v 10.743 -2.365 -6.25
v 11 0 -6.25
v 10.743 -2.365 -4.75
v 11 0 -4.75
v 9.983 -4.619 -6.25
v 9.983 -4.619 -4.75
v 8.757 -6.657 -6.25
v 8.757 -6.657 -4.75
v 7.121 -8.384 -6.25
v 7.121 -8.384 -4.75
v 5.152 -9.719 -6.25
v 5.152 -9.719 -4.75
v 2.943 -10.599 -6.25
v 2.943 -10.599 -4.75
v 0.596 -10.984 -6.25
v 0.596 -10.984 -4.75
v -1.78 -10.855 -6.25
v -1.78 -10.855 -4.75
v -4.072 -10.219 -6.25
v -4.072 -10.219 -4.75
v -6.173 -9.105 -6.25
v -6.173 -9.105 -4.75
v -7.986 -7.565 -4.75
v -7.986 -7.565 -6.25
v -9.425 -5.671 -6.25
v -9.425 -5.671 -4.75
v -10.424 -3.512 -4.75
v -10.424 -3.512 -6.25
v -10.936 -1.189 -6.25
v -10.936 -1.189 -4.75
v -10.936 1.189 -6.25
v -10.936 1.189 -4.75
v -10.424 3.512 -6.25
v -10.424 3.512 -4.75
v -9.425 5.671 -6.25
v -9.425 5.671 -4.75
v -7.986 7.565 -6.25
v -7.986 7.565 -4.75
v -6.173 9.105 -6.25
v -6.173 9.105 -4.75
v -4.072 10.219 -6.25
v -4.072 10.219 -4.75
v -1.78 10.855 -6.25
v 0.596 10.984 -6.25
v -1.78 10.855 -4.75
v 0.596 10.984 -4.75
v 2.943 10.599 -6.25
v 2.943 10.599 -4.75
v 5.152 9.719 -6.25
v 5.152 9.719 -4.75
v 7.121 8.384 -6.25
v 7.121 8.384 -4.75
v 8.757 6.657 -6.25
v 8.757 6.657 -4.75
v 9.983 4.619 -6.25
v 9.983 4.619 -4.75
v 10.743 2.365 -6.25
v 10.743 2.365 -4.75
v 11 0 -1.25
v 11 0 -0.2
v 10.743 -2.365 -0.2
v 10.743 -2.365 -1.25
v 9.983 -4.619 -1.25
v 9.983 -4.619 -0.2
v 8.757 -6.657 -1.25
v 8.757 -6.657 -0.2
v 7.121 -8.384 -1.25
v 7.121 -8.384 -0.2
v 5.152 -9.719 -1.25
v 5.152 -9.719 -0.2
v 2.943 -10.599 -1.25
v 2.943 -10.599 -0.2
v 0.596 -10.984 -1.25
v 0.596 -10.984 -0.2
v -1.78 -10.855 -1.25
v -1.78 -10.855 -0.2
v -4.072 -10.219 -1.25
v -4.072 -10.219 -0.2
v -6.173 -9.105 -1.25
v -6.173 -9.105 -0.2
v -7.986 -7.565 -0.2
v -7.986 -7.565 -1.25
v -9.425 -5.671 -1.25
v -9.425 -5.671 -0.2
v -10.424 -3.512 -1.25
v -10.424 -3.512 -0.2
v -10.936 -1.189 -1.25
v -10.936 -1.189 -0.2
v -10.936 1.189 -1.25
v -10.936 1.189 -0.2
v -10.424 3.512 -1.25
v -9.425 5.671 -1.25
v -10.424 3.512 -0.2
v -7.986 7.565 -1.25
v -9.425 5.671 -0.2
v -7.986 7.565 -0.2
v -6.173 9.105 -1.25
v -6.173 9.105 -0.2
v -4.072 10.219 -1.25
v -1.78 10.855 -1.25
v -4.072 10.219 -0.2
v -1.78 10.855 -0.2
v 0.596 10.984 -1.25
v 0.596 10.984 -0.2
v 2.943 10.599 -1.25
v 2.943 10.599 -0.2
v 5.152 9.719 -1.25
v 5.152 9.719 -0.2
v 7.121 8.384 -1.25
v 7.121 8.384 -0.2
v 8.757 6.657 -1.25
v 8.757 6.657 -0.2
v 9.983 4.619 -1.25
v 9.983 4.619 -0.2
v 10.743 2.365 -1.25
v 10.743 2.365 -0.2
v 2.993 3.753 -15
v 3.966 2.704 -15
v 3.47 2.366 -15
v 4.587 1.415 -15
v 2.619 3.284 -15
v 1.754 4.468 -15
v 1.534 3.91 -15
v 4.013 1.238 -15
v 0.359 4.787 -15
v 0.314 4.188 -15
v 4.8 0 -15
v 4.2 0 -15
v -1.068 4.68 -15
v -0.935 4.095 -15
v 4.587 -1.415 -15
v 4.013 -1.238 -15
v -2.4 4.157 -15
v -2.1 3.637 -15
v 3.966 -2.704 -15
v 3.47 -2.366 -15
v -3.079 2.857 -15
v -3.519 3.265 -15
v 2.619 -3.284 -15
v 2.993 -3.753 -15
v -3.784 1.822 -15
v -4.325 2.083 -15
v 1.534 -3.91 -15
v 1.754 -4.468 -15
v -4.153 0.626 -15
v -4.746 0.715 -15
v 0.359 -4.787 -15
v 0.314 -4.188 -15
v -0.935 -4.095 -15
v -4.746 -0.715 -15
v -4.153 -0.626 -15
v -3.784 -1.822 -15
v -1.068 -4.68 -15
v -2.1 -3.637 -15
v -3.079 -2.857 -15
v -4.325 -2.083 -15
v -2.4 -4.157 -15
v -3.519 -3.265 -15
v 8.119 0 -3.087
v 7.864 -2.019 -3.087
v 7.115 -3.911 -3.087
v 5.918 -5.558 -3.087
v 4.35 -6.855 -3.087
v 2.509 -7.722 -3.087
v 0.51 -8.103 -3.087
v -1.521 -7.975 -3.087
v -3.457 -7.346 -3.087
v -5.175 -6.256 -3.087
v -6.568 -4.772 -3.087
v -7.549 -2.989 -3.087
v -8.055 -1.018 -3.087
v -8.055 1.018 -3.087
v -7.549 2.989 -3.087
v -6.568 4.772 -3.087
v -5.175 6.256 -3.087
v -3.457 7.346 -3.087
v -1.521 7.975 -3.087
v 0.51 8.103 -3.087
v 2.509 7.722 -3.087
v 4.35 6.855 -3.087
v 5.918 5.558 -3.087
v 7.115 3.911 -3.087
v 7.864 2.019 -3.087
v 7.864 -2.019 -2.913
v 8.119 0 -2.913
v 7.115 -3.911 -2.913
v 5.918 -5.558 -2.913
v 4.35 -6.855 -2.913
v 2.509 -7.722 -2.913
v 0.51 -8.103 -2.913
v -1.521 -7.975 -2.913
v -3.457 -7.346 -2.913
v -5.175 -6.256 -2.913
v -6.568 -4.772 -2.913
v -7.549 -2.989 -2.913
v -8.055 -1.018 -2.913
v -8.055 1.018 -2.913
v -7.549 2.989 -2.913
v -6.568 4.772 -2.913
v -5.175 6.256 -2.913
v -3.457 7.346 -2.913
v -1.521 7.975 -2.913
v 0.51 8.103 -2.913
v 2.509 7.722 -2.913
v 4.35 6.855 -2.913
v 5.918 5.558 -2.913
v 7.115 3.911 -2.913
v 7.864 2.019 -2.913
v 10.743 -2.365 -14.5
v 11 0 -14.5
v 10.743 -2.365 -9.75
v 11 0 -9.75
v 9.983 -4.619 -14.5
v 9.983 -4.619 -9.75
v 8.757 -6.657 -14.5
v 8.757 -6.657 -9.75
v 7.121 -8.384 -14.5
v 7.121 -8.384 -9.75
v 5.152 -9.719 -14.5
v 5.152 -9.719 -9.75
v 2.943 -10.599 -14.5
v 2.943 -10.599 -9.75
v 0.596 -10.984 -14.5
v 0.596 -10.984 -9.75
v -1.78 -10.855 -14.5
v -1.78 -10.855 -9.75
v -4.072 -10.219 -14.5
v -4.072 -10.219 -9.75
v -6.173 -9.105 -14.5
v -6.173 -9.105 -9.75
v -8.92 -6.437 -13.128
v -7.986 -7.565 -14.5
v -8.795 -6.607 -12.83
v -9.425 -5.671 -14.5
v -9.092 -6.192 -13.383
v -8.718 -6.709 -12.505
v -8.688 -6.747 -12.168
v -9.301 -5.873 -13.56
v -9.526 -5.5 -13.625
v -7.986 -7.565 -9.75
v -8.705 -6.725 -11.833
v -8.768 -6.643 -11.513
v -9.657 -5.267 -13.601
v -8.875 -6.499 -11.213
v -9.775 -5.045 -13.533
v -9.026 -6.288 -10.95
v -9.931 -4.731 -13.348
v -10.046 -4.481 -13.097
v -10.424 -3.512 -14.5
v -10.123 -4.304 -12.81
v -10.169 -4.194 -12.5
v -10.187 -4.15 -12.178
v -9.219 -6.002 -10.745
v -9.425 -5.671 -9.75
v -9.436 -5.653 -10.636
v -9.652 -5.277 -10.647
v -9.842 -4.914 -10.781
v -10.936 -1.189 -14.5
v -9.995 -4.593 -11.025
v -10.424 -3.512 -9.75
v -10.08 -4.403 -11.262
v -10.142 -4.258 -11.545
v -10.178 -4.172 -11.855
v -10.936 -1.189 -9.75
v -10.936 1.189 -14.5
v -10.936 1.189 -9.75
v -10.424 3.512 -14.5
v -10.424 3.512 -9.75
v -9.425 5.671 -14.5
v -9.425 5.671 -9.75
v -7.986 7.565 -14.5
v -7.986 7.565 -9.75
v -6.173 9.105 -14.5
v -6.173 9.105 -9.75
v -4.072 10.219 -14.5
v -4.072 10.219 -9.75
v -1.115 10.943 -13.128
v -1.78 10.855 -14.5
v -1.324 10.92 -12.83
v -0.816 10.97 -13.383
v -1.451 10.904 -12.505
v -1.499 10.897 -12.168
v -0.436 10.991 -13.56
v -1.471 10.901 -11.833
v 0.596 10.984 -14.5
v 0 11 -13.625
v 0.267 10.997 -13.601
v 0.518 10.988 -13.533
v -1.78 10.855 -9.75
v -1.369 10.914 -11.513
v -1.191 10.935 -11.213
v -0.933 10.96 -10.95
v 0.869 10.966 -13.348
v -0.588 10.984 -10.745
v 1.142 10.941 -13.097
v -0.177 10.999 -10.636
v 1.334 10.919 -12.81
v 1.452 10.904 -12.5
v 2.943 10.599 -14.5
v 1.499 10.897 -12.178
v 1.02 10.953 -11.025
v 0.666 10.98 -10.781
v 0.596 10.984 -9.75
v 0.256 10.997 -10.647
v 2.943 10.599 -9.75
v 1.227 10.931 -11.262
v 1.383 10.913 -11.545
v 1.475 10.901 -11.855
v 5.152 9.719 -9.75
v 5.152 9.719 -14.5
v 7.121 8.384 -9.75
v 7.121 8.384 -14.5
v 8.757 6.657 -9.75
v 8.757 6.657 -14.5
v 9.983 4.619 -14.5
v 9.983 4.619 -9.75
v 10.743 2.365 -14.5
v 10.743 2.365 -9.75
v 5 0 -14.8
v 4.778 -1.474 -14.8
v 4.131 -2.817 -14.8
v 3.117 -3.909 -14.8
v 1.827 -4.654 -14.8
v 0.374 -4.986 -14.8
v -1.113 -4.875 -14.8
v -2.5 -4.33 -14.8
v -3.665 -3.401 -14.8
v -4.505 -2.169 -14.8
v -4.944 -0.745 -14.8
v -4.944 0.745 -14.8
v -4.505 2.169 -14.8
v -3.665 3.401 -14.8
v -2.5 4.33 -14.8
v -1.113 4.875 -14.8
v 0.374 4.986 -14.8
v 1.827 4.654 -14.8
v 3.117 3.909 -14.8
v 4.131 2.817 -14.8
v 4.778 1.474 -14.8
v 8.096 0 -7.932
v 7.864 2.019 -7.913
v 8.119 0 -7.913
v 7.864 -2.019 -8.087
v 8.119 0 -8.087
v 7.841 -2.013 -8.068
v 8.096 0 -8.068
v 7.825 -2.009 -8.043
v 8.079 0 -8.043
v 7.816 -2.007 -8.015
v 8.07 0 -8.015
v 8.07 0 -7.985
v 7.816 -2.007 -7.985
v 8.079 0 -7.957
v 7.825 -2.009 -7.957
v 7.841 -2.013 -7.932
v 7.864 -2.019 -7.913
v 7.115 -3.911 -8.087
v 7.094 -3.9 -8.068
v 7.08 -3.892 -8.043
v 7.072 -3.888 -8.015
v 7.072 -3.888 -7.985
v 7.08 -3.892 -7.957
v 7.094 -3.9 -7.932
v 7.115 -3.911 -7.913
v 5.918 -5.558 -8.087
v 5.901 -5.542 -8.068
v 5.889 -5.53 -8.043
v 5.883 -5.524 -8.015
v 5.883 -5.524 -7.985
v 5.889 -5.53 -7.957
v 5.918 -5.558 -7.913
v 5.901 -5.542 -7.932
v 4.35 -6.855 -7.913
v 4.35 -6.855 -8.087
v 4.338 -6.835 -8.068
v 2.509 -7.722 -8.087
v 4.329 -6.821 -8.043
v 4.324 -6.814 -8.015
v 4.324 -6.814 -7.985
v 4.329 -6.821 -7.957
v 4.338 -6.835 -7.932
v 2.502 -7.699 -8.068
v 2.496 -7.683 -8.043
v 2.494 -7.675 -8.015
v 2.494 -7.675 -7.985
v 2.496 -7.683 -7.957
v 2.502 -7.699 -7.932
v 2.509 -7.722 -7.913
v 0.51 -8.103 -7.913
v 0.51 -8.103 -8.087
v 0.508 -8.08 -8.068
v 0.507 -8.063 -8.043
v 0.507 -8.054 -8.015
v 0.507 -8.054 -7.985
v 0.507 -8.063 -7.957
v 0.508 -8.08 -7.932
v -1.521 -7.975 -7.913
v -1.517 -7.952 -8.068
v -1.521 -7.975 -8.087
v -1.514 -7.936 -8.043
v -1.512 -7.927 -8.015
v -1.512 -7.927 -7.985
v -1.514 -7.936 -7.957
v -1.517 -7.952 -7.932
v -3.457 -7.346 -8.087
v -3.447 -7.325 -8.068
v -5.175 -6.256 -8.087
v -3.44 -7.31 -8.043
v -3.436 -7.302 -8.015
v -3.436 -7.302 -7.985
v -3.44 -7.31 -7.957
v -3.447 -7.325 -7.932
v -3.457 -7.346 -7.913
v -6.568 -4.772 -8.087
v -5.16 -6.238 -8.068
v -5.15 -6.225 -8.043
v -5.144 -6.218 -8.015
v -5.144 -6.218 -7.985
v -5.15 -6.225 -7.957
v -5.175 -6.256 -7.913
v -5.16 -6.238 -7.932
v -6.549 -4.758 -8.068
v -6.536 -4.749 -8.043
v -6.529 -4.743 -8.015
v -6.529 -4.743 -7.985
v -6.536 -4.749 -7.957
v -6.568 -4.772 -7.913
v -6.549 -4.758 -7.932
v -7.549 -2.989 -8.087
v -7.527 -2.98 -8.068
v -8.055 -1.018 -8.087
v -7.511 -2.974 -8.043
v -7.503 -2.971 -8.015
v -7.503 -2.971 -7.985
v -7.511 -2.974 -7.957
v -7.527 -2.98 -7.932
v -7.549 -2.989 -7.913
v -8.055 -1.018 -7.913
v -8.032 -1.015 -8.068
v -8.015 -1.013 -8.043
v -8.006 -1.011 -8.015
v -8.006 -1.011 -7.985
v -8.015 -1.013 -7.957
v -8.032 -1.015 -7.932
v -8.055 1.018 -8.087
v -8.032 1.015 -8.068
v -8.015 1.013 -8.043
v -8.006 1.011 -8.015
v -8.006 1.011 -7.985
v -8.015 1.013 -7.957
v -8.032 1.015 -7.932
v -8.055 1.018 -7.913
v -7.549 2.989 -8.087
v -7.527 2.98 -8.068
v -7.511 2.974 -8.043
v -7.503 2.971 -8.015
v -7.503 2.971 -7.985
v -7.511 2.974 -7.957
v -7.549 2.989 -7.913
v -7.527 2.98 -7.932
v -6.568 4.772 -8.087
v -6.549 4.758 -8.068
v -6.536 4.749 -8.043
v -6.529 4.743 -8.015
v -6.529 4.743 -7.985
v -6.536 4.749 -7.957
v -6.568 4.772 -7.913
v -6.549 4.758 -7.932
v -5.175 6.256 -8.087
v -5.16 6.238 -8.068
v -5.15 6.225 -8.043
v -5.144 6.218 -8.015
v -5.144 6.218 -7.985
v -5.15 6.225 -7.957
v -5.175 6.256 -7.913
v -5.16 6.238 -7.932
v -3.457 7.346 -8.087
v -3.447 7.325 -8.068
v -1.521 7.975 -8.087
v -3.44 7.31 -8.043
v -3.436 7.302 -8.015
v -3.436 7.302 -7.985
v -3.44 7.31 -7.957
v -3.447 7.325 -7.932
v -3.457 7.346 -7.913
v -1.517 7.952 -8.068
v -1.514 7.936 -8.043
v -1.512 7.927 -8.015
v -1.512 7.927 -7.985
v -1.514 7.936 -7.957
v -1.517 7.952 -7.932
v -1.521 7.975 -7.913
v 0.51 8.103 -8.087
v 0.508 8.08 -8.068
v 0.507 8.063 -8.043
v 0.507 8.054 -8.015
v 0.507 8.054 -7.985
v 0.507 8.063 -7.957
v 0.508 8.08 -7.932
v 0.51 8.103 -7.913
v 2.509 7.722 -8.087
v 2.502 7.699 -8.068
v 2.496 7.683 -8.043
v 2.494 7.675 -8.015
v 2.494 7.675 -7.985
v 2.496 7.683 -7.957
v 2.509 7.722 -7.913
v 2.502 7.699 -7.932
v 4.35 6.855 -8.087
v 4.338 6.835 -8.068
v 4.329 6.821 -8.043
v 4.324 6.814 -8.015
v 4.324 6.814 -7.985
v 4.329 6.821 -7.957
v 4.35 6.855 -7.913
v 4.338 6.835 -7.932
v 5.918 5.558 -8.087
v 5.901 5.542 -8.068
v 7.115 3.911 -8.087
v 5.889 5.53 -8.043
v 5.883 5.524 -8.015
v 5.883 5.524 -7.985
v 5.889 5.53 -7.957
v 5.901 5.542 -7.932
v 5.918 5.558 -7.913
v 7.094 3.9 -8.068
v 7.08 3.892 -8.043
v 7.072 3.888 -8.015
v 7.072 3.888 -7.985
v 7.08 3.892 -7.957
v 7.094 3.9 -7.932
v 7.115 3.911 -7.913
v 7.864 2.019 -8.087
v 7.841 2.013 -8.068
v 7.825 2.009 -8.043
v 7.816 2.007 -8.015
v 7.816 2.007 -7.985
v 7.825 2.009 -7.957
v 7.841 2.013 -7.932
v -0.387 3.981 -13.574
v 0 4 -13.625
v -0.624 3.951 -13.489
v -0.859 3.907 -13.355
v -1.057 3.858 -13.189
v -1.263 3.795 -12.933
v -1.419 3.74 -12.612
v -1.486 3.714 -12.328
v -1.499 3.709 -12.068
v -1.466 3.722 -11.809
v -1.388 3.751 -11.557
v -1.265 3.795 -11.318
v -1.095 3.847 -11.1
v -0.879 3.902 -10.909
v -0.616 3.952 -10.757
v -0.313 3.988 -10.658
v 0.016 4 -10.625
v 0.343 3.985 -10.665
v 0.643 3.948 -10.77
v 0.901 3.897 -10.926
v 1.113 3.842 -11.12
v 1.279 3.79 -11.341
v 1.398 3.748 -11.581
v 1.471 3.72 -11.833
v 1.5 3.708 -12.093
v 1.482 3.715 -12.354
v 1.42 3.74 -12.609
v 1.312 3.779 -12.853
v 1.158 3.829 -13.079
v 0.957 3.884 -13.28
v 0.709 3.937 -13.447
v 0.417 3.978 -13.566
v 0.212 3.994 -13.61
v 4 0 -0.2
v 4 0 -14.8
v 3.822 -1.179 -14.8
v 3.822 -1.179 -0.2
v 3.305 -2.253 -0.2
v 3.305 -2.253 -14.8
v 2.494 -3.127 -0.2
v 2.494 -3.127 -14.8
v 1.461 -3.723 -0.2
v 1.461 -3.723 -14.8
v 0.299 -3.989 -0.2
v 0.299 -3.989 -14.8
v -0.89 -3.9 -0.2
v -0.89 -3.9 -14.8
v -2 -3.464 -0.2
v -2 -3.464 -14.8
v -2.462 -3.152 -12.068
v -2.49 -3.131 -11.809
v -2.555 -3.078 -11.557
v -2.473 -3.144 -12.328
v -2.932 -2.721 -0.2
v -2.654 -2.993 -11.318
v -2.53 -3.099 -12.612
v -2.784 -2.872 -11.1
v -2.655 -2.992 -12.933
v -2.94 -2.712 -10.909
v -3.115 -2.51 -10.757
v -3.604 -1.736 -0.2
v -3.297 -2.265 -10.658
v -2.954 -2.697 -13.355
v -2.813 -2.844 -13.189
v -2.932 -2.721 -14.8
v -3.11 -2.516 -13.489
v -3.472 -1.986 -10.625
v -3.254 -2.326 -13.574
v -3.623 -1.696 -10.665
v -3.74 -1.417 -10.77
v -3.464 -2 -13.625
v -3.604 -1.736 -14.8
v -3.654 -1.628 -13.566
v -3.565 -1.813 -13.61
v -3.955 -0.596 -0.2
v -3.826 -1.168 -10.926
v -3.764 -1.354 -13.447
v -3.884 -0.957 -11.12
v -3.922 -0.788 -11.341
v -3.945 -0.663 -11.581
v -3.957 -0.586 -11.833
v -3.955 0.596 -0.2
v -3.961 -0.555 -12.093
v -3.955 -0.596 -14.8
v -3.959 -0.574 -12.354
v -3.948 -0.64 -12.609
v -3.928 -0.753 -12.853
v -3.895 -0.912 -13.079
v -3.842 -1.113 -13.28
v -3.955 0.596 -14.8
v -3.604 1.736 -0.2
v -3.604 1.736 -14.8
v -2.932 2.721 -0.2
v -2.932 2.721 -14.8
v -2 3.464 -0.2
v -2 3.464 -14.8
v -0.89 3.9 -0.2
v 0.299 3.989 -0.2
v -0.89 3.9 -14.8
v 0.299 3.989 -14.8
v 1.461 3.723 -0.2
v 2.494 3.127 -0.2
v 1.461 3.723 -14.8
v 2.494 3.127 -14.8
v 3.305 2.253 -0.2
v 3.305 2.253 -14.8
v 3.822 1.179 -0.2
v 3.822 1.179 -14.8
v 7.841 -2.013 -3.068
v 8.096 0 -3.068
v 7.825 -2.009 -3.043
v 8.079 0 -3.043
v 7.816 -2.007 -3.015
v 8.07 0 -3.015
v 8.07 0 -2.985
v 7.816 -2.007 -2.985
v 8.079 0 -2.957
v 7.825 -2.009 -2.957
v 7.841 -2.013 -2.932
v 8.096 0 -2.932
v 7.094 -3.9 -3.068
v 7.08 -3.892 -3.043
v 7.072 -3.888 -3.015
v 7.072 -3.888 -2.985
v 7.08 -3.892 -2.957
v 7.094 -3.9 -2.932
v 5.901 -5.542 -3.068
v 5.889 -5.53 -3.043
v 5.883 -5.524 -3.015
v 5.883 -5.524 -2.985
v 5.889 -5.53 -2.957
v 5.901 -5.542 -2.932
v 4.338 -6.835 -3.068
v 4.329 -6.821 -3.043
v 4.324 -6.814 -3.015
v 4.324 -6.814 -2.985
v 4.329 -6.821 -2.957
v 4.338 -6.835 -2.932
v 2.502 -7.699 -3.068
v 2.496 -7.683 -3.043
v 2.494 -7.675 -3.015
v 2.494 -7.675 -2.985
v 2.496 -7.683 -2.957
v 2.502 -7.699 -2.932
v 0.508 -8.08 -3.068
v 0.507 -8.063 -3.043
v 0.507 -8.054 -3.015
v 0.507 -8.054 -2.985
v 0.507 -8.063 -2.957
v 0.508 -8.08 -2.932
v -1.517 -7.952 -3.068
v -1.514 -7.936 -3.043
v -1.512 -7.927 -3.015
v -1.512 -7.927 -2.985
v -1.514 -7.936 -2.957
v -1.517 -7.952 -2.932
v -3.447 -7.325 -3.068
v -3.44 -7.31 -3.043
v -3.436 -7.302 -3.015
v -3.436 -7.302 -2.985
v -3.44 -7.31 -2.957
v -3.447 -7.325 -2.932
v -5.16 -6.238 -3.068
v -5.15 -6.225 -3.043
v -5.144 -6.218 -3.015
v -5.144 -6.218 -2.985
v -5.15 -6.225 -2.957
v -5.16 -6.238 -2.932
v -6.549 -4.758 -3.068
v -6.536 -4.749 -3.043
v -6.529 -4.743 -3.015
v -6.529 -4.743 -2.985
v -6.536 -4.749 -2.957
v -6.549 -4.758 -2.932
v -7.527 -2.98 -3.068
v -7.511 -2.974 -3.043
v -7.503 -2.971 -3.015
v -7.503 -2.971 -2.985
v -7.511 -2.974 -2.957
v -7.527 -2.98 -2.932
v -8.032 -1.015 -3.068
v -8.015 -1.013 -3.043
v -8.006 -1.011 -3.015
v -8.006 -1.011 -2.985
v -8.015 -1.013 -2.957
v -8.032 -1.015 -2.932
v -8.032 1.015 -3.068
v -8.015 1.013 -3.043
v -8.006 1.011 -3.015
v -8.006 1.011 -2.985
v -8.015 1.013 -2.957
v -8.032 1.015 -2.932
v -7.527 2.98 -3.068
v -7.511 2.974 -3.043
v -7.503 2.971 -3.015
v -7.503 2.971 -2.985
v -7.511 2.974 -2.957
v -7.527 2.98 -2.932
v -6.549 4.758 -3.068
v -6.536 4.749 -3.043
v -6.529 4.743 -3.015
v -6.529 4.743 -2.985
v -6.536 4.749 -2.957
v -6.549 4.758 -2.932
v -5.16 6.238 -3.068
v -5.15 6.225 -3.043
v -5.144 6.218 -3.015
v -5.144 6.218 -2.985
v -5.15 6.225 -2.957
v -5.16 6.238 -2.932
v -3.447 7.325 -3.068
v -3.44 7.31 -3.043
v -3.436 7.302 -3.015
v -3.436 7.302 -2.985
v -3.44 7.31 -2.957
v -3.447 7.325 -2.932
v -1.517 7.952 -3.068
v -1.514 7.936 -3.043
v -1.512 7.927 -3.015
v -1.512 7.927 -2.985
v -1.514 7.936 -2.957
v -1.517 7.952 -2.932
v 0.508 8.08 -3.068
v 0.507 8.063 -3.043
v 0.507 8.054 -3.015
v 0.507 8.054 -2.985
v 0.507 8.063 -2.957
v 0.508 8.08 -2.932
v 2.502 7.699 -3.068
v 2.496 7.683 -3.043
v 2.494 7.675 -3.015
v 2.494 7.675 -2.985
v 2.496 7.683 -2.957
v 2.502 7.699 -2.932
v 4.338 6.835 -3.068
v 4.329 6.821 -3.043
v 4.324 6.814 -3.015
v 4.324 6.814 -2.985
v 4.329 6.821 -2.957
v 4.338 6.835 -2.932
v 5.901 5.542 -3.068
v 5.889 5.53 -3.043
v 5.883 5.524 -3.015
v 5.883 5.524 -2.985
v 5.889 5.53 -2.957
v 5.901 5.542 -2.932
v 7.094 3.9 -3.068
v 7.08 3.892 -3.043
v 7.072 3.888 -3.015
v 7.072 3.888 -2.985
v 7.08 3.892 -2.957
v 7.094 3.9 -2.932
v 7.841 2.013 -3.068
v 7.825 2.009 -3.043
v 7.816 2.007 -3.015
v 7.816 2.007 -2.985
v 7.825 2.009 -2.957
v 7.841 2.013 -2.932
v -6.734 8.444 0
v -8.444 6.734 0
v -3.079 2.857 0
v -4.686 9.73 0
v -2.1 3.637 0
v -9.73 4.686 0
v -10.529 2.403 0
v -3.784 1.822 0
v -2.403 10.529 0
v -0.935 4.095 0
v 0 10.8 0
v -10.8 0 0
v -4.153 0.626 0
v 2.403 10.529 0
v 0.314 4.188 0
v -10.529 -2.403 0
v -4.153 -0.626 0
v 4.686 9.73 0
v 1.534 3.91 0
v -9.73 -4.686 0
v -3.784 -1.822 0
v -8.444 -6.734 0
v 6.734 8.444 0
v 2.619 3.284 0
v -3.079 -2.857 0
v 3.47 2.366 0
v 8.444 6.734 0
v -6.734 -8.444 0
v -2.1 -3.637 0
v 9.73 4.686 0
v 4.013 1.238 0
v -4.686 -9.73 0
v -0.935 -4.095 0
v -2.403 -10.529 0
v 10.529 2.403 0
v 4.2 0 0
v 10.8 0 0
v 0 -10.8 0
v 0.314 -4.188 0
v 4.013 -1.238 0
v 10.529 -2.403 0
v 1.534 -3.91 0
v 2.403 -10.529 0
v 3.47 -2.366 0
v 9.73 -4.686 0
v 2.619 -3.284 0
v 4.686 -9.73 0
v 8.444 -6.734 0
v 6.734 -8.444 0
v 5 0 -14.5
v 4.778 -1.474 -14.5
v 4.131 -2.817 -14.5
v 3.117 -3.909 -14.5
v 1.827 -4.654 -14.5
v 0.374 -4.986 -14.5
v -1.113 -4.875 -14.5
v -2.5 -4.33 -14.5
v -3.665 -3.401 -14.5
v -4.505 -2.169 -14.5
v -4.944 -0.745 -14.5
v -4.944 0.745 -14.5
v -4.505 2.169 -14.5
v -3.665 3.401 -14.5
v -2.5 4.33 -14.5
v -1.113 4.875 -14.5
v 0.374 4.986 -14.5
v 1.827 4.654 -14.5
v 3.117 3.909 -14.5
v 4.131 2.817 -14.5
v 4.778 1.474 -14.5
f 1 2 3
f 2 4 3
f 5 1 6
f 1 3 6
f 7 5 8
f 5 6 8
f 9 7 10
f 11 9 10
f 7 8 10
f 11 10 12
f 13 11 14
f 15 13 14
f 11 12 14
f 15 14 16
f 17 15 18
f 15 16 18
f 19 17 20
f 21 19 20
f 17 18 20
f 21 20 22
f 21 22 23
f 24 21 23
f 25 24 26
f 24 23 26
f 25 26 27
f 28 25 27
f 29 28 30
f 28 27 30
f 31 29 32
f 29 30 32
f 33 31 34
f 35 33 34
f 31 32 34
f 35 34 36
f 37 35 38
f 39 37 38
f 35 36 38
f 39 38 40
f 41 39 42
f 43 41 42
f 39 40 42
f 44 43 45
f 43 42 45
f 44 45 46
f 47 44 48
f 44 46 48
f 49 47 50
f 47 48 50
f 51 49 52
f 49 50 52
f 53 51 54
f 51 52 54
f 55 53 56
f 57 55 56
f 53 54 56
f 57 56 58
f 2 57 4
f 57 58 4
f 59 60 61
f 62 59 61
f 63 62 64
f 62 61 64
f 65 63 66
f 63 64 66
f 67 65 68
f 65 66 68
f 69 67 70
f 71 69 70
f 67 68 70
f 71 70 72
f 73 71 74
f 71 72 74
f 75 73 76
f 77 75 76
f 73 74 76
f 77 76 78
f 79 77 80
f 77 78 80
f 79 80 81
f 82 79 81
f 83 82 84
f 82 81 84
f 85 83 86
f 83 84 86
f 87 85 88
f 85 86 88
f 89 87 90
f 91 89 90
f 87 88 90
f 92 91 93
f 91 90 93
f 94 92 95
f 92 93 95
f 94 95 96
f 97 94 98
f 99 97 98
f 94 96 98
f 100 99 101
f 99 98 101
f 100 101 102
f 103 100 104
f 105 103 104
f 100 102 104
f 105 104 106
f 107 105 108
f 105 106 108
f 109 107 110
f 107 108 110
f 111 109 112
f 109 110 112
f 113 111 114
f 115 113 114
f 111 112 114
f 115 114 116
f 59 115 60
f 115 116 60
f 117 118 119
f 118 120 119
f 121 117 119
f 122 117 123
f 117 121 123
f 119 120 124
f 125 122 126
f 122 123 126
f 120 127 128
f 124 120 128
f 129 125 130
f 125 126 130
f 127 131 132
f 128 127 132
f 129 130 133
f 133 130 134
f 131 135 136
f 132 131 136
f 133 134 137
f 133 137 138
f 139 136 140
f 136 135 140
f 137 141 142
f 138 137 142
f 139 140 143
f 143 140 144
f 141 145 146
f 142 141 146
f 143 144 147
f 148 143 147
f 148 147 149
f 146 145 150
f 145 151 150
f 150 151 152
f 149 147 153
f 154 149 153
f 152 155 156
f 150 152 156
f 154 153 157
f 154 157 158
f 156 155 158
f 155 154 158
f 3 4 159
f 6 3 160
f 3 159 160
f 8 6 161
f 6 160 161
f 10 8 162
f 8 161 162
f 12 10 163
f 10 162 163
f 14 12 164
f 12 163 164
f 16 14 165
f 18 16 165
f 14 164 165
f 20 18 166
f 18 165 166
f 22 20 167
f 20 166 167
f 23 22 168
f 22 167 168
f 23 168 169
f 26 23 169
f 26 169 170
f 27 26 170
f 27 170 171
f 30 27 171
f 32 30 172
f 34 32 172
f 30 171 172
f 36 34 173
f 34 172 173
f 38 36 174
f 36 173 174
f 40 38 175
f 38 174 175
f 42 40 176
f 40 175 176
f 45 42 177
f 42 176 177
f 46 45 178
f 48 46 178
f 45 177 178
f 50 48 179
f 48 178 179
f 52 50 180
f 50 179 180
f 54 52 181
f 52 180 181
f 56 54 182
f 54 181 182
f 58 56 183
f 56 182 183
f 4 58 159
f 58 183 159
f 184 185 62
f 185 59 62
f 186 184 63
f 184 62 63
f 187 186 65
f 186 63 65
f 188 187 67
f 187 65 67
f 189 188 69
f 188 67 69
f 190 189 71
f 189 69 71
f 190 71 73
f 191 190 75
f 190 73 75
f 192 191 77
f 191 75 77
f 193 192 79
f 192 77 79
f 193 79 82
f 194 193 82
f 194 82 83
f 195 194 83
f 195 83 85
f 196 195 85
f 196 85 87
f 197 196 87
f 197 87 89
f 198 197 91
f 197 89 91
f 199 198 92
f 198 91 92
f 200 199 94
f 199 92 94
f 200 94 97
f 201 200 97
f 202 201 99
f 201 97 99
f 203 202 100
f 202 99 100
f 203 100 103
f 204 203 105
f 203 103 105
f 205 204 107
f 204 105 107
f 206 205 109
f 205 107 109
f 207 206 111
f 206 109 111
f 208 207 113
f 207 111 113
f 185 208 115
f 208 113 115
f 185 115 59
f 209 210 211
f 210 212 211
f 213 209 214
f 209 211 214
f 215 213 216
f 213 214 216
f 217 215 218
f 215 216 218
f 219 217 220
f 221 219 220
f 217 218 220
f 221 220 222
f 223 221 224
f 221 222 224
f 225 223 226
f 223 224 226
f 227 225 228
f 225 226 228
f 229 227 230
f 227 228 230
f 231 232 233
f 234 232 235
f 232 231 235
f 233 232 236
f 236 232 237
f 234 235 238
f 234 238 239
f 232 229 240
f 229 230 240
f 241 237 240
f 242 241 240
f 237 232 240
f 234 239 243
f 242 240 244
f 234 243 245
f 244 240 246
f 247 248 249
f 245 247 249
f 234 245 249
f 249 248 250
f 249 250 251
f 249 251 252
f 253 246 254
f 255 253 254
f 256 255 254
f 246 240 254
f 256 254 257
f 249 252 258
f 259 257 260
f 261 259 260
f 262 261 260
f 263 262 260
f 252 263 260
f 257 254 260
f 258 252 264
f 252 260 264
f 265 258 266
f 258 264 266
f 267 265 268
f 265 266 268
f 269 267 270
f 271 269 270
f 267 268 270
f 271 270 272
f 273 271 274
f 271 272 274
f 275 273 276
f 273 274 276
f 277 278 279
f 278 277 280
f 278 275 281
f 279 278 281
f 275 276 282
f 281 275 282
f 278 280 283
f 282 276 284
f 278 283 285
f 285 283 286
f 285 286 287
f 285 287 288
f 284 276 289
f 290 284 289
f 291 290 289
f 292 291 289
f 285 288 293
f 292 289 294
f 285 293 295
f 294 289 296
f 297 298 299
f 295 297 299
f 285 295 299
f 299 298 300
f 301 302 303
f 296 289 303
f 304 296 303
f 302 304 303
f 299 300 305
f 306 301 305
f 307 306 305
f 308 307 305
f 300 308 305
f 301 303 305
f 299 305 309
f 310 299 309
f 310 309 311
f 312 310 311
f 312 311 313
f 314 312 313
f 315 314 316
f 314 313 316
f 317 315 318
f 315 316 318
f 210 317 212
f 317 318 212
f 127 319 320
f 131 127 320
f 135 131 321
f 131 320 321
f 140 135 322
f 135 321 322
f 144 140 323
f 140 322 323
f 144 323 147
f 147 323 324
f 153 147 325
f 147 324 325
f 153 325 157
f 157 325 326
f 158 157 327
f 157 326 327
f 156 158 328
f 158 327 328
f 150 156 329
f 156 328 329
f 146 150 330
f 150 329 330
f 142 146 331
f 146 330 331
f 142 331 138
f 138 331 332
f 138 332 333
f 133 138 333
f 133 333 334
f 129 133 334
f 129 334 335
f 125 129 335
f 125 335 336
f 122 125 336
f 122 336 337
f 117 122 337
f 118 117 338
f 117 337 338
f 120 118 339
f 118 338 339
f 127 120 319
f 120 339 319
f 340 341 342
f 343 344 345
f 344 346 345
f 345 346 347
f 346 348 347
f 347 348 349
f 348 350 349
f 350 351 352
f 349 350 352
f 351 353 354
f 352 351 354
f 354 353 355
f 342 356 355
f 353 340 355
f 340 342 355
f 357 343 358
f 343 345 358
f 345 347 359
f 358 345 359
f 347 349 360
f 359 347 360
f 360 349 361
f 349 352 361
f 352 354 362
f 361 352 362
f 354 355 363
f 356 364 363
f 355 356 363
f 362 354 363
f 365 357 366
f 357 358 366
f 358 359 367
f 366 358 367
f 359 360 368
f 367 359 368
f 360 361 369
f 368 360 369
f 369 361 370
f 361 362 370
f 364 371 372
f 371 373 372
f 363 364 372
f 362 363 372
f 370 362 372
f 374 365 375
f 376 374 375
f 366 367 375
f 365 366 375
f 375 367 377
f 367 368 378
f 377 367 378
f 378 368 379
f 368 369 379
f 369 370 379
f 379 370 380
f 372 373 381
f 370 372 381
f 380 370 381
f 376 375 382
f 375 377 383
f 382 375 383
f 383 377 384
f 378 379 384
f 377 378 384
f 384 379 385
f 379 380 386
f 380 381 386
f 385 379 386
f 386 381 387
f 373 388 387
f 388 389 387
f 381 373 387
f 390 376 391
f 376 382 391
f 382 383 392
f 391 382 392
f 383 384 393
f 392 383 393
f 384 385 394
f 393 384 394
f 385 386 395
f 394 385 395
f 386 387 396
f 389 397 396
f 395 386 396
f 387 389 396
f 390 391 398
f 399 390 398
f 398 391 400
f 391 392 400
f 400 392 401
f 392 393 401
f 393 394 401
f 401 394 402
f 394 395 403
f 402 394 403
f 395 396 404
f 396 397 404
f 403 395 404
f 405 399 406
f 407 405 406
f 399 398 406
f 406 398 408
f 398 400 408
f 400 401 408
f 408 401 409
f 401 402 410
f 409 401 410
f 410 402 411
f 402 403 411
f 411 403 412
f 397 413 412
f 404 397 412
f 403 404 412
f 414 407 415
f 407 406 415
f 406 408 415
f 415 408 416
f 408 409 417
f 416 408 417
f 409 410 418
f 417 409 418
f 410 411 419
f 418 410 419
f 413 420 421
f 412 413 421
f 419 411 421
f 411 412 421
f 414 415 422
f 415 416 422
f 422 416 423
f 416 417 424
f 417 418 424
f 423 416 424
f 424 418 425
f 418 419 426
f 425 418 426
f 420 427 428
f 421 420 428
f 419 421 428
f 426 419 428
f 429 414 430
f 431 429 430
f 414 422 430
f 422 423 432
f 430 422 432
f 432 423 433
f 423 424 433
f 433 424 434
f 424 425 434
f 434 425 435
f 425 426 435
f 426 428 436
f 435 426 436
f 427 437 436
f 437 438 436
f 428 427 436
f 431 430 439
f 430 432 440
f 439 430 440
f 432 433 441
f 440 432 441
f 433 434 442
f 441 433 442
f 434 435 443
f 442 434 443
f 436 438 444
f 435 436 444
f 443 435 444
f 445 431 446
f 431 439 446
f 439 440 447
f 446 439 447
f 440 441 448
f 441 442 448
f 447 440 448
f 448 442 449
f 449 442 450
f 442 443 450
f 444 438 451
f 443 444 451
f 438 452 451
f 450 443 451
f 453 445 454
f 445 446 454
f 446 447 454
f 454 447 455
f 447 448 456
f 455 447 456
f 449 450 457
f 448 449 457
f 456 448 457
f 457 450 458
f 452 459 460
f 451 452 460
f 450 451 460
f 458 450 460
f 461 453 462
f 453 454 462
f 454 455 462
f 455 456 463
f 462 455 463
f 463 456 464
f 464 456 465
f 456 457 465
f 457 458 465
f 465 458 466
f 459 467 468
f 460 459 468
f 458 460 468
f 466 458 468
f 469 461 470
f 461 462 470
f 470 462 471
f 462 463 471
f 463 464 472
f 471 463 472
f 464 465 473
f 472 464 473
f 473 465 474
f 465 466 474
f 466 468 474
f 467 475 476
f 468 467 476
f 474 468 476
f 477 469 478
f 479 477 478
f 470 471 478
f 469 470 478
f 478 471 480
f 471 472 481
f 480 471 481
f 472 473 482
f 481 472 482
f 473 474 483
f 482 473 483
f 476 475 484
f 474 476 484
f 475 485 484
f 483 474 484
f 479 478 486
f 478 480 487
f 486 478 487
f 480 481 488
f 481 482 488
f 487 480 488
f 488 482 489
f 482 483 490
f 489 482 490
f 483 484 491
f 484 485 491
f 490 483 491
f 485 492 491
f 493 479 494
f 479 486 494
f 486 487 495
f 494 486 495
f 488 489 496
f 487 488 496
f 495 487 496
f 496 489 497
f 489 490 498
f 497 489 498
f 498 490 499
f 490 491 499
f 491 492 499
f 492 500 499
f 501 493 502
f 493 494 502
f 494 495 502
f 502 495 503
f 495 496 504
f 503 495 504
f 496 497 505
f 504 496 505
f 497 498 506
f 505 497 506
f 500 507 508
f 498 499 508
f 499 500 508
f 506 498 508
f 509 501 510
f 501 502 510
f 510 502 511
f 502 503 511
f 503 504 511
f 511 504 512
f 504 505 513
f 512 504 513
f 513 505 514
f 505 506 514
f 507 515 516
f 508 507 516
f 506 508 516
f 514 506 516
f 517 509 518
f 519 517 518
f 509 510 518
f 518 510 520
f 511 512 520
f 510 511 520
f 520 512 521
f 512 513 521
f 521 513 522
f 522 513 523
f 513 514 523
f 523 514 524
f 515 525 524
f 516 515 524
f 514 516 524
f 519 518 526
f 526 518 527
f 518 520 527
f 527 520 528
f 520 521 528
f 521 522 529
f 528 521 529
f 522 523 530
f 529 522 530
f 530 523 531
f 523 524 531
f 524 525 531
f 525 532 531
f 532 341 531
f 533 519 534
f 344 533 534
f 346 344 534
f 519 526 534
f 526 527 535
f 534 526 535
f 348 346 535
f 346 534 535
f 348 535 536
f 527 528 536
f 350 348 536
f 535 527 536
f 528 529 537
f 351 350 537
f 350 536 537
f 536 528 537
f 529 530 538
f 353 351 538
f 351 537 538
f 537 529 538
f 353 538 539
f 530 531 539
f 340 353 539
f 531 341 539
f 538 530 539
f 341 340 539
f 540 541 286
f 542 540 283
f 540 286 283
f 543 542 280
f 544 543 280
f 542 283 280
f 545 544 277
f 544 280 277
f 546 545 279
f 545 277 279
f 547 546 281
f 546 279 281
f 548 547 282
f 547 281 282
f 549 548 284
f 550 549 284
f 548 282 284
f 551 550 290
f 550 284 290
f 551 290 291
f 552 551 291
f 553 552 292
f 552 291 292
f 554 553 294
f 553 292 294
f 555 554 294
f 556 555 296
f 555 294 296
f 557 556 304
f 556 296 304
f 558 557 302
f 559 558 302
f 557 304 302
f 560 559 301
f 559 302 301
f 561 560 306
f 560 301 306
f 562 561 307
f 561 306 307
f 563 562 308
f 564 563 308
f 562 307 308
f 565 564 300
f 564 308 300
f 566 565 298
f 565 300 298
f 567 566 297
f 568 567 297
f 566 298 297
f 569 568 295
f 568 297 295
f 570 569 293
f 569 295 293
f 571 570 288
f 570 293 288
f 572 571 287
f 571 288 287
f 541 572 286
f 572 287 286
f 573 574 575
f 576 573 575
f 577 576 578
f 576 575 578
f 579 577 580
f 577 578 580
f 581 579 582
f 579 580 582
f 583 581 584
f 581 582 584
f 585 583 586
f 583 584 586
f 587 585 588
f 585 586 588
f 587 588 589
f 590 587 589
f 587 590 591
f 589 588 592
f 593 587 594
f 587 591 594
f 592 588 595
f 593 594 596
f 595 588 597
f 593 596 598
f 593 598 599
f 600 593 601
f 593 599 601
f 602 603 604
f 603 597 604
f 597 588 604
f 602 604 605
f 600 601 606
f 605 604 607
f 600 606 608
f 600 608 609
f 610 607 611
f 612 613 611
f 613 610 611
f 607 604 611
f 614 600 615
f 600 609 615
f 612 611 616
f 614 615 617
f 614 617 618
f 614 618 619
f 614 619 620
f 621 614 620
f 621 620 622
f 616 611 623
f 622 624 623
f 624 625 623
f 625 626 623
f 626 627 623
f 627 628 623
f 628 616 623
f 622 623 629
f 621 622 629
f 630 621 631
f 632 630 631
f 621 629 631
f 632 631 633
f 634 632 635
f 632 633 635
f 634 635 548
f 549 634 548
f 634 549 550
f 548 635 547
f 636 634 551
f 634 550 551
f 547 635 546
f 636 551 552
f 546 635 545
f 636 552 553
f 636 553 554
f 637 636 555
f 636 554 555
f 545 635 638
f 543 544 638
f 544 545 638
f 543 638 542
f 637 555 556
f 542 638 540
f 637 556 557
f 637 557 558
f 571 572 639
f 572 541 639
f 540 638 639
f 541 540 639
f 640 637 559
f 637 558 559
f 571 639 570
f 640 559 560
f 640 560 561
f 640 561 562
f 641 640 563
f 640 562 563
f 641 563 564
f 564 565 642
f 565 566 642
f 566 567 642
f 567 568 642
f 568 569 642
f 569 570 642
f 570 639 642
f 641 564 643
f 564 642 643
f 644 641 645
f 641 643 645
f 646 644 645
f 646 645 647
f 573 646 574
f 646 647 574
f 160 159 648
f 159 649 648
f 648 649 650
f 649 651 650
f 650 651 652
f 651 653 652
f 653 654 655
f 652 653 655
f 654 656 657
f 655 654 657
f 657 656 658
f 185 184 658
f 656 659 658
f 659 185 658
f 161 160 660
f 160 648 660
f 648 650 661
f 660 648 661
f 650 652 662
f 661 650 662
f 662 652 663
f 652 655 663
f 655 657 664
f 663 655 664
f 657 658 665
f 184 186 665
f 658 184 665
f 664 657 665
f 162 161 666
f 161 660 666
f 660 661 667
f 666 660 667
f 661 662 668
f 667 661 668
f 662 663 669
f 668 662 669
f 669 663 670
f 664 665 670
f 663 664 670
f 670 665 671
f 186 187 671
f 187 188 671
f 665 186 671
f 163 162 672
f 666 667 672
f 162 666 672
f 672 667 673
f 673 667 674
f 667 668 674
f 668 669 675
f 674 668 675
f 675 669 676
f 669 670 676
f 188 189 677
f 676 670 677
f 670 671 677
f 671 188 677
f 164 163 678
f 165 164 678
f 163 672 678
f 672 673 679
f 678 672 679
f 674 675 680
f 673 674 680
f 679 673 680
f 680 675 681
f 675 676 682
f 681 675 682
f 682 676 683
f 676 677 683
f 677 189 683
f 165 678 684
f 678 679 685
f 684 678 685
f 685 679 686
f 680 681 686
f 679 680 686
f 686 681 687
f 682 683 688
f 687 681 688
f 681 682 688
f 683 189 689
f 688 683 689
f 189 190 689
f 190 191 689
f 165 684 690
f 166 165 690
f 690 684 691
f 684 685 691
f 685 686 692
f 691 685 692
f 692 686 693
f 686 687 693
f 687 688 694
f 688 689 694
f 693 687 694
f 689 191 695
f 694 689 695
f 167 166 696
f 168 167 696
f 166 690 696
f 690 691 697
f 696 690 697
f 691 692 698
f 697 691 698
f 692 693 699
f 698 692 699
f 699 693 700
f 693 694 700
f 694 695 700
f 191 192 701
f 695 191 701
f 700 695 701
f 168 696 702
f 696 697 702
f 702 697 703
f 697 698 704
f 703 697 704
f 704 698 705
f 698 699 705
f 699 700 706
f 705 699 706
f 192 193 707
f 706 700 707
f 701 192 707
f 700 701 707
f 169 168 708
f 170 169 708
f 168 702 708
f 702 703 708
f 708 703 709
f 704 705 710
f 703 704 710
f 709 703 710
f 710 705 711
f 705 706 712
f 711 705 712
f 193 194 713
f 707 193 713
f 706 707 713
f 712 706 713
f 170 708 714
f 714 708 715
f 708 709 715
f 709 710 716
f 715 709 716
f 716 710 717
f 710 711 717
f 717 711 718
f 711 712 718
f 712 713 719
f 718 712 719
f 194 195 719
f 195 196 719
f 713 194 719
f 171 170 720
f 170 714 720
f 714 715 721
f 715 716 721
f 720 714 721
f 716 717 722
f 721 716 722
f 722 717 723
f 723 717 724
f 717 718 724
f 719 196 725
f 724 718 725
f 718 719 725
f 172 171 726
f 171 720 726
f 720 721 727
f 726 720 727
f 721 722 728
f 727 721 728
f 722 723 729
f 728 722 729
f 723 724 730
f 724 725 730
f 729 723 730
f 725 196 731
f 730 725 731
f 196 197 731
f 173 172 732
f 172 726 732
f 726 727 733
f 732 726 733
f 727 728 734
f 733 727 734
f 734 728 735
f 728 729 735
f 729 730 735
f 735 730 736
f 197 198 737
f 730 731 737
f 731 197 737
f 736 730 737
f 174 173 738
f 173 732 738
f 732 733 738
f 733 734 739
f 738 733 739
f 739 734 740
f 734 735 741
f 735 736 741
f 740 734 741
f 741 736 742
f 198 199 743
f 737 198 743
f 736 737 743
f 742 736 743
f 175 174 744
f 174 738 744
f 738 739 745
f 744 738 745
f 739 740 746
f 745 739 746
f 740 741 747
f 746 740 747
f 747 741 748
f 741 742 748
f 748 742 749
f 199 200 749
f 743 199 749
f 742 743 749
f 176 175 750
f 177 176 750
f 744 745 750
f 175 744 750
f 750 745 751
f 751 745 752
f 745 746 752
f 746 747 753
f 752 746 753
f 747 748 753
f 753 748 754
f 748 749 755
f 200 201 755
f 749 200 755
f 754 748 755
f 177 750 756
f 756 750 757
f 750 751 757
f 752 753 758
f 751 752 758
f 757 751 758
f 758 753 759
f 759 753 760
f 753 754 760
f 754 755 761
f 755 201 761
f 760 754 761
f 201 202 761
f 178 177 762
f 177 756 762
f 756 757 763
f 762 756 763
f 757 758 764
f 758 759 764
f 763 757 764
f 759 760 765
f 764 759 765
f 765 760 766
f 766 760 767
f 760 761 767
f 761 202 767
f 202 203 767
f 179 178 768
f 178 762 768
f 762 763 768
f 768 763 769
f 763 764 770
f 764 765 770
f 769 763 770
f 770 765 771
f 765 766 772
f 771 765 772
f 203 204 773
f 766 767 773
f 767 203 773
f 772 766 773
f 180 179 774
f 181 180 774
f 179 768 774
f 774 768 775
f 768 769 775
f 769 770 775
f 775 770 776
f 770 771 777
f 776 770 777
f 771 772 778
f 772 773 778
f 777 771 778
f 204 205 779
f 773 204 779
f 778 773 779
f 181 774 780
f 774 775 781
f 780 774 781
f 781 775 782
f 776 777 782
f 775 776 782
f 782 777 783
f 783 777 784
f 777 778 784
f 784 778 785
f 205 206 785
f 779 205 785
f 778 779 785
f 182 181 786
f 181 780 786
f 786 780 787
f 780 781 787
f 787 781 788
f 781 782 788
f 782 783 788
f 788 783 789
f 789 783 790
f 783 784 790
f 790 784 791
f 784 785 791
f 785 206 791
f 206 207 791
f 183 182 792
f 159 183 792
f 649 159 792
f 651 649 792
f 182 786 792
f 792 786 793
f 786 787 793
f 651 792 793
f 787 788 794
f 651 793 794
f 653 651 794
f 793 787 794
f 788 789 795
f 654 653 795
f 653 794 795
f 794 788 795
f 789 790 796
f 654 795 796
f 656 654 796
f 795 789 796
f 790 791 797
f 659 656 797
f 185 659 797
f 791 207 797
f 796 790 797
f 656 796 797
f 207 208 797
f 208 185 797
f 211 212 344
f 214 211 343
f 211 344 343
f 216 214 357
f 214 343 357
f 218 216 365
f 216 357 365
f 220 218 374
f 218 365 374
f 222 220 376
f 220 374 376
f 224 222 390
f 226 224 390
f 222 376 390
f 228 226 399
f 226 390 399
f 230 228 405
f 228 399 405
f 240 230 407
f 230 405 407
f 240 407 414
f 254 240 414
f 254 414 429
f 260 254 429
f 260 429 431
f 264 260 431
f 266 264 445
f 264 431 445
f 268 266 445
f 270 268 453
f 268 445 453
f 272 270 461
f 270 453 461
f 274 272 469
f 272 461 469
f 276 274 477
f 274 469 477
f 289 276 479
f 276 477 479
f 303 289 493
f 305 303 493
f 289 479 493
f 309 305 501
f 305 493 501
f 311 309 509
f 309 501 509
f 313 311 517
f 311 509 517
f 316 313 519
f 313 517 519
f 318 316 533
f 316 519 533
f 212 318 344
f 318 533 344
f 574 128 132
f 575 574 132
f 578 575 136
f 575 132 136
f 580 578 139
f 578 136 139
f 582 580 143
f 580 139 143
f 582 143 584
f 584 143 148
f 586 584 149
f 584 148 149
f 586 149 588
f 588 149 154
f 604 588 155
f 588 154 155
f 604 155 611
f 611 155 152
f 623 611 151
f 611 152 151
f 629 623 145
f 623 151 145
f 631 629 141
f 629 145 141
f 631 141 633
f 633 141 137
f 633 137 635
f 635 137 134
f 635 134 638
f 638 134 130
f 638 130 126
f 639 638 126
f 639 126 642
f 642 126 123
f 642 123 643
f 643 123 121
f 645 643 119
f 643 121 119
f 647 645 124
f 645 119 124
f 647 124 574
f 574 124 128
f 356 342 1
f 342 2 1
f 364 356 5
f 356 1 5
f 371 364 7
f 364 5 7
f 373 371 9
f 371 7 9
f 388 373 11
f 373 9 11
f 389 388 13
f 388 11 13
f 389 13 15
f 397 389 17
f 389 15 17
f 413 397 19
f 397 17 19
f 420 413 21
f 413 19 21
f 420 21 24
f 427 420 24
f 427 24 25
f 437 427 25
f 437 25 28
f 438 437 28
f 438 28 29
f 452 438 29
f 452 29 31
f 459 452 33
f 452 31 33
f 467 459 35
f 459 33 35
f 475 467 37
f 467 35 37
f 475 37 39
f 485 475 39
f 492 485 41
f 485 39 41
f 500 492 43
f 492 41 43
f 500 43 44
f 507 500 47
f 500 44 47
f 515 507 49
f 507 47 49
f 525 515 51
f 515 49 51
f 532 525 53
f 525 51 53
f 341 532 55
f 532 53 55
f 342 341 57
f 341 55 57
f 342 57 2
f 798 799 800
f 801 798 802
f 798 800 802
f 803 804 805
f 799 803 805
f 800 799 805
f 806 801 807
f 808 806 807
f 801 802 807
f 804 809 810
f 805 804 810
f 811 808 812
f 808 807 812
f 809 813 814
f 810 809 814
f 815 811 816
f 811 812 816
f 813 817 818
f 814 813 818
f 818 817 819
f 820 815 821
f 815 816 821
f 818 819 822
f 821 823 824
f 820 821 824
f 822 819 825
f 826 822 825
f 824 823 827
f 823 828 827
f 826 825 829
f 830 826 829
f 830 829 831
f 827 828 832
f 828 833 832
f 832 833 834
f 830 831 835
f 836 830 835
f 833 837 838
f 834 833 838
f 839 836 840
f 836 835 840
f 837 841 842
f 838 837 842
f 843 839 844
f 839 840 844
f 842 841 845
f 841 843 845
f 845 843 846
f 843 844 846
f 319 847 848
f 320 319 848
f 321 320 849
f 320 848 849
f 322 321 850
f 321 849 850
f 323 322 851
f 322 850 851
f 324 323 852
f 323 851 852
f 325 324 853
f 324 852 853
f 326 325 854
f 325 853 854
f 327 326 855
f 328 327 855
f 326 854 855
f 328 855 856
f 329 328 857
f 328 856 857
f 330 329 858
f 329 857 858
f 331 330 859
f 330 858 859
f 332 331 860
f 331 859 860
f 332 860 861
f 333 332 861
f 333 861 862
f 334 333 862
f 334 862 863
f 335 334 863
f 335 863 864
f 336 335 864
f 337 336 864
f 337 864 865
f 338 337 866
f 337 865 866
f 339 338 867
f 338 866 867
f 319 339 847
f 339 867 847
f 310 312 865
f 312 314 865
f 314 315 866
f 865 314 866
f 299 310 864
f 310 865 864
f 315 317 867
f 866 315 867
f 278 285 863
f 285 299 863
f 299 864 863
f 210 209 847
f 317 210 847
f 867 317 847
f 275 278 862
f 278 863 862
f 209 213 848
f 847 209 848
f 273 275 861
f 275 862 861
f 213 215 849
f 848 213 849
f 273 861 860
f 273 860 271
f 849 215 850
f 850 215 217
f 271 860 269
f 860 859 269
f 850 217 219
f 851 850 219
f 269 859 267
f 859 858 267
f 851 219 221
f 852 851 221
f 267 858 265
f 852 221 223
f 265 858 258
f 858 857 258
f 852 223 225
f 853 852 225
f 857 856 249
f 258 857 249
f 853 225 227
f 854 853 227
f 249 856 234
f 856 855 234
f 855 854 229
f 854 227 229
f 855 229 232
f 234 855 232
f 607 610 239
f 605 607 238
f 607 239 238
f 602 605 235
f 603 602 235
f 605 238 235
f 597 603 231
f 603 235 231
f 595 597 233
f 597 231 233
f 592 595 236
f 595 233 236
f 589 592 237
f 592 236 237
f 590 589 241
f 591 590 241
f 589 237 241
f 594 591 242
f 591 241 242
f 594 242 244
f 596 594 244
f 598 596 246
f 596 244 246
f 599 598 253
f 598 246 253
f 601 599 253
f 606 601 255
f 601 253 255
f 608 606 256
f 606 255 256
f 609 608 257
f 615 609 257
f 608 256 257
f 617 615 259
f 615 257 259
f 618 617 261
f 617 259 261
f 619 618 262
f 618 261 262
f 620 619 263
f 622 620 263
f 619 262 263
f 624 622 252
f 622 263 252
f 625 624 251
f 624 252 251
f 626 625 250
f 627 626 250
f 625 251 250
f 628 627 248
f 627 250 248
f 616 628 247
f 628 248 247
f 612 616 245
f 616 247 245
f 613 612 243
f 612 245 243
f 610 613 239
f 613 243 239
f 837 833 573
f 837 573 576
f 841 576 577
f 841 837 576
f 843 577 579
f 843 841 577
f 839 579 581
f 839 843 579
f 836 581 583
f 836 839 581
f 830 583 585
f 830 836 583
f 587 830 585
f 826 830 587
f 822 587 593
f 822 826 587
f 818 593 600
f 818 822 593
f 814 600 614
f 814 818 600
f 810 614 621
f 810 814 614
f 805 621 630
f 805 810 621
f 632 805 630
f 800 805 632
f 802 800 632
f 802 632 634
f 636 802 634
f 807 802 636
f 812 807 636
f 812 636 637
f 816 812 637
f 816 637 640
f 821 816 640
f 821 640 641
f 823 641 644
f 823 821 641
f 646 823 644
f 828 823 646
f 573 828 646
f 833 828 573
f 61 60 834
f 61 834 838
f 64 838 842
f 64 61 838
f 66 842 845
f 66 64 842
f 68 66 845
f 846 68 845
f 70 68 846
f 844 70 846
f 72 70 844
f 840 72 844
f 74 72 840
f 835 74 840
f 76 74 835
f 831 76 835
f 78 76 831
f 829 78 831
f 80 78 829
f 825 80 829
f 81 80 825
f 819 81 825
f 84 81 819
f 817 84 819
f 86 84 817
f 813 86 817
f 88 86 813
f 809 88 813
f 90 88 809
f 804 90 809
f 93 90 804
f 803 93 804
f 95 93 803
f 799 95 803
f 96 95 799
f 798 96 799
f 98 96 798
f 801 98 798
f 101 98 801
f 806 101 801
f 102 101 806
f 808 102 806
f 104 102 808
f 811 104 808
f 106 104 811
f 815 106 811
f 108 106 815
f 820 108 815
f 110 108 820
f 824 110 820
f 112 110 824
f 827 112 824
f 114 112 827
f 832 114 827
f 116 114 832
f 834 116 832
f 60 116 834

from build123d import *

# Parameters (mm, degrees)
SKETCH_2_W               = 1.5
SKETCH_2_H               = 15.026279442
PATTERN_CIRCULAR_1_COUNT = 2
PATTERN_CIRCULAR_1_ANGLE = 120
CHAMFER_1_SIZE           = 0.2


with BuildPart() as part:
    # 草图1 → 旋转1 (revolve)
    with BuildSketch(Plane(origin=(0, 0, 0), x_dir=(0, 0, -1), z_dir=(1, 0, 0)), mode=Mode.PRIVATE) as revolve_1_sk:
        with BuildLine():
            Line((0, 4), (15, 4))
            Line((15, 4), (15, 5))
            Line((15, 5), (14.5, 5))
            Line((14.5, 5), (14.5, 11))
            Line((14.5, 11), (9.75, 11))
            Line((9.75, 11), (8.08660254, 8.118911087))
            ThreePointArc((8.08660254, 8.118911087), (8, 8.068911087), (7.91339746, 8.118911087))
            Line((7.91339746, 8.118911087), (6.25, 11))
            Line((6.25, 11), (4.75, 11))
            Line((4.75, 11), (3.08660254, 8.118911087))
            ThreePointArc((3.08660254, 8.118911087), (3, 8.068911087), (2.91339746, 8.118911087))
            Line((2.91339746, 8.118911087), (1.25, 11))
            Line((1.25, 11), (0, 11))
            Line((0, 11), (0, 4))
        make_face()
    revolve(revolve_1_sk.sketch.rotate(Axis((0, 0, 0), (0, 0, -1)), 90), axis=Axis((0, 0, 0), (0, 0, -1)))

    # 草图2 → M3 螺纹孔1 (revolve, cut)
    with BuildSketch(Plane(origin=(0, 0, -12.125), x_dir=(0, 0, -1), z_dir=(1, 0, 0))):
        with Locations((0.75, 7.513139721)):
            Rectangle(SKETCH_2_W, SKETCH_2_H)
    hole_wizard_m3_1 = revolve(axis=Axis((0, -6.35, -12.125), (0, 1, 0)), mode=Mode.SUBTRACT)

    # 阵列(圆周)1: M3 螺纹孔1 ×2 about axis
    pattern_circular_1_axis = Axis((0, 0, 0), (0, 0, 1))
    for i in range(1, PATTERN_CIRCULAR_1_COUNT):
        add(hole_wizard_m3_1.rotate(pattern_circular_1_axis, i * PATTERN_CIRCULAR_1_ANGLE / (PATTERN_CIRCULAR_1_COUNT - 1)), mode=Mode.SUBTRACT)

    # 倒角1
    chamfer_1_edges = [part.edges().sort_by_distance(p)[0] for p in [
        (-5, 0, -15),
        (-11, 0, 0),
        (-4, 0, 0),
        (-4, 0, -15),
    ]]
    chamfer(chamfer_1_edges, length=CHAMFER_1_SIZE)


solid = part.part
